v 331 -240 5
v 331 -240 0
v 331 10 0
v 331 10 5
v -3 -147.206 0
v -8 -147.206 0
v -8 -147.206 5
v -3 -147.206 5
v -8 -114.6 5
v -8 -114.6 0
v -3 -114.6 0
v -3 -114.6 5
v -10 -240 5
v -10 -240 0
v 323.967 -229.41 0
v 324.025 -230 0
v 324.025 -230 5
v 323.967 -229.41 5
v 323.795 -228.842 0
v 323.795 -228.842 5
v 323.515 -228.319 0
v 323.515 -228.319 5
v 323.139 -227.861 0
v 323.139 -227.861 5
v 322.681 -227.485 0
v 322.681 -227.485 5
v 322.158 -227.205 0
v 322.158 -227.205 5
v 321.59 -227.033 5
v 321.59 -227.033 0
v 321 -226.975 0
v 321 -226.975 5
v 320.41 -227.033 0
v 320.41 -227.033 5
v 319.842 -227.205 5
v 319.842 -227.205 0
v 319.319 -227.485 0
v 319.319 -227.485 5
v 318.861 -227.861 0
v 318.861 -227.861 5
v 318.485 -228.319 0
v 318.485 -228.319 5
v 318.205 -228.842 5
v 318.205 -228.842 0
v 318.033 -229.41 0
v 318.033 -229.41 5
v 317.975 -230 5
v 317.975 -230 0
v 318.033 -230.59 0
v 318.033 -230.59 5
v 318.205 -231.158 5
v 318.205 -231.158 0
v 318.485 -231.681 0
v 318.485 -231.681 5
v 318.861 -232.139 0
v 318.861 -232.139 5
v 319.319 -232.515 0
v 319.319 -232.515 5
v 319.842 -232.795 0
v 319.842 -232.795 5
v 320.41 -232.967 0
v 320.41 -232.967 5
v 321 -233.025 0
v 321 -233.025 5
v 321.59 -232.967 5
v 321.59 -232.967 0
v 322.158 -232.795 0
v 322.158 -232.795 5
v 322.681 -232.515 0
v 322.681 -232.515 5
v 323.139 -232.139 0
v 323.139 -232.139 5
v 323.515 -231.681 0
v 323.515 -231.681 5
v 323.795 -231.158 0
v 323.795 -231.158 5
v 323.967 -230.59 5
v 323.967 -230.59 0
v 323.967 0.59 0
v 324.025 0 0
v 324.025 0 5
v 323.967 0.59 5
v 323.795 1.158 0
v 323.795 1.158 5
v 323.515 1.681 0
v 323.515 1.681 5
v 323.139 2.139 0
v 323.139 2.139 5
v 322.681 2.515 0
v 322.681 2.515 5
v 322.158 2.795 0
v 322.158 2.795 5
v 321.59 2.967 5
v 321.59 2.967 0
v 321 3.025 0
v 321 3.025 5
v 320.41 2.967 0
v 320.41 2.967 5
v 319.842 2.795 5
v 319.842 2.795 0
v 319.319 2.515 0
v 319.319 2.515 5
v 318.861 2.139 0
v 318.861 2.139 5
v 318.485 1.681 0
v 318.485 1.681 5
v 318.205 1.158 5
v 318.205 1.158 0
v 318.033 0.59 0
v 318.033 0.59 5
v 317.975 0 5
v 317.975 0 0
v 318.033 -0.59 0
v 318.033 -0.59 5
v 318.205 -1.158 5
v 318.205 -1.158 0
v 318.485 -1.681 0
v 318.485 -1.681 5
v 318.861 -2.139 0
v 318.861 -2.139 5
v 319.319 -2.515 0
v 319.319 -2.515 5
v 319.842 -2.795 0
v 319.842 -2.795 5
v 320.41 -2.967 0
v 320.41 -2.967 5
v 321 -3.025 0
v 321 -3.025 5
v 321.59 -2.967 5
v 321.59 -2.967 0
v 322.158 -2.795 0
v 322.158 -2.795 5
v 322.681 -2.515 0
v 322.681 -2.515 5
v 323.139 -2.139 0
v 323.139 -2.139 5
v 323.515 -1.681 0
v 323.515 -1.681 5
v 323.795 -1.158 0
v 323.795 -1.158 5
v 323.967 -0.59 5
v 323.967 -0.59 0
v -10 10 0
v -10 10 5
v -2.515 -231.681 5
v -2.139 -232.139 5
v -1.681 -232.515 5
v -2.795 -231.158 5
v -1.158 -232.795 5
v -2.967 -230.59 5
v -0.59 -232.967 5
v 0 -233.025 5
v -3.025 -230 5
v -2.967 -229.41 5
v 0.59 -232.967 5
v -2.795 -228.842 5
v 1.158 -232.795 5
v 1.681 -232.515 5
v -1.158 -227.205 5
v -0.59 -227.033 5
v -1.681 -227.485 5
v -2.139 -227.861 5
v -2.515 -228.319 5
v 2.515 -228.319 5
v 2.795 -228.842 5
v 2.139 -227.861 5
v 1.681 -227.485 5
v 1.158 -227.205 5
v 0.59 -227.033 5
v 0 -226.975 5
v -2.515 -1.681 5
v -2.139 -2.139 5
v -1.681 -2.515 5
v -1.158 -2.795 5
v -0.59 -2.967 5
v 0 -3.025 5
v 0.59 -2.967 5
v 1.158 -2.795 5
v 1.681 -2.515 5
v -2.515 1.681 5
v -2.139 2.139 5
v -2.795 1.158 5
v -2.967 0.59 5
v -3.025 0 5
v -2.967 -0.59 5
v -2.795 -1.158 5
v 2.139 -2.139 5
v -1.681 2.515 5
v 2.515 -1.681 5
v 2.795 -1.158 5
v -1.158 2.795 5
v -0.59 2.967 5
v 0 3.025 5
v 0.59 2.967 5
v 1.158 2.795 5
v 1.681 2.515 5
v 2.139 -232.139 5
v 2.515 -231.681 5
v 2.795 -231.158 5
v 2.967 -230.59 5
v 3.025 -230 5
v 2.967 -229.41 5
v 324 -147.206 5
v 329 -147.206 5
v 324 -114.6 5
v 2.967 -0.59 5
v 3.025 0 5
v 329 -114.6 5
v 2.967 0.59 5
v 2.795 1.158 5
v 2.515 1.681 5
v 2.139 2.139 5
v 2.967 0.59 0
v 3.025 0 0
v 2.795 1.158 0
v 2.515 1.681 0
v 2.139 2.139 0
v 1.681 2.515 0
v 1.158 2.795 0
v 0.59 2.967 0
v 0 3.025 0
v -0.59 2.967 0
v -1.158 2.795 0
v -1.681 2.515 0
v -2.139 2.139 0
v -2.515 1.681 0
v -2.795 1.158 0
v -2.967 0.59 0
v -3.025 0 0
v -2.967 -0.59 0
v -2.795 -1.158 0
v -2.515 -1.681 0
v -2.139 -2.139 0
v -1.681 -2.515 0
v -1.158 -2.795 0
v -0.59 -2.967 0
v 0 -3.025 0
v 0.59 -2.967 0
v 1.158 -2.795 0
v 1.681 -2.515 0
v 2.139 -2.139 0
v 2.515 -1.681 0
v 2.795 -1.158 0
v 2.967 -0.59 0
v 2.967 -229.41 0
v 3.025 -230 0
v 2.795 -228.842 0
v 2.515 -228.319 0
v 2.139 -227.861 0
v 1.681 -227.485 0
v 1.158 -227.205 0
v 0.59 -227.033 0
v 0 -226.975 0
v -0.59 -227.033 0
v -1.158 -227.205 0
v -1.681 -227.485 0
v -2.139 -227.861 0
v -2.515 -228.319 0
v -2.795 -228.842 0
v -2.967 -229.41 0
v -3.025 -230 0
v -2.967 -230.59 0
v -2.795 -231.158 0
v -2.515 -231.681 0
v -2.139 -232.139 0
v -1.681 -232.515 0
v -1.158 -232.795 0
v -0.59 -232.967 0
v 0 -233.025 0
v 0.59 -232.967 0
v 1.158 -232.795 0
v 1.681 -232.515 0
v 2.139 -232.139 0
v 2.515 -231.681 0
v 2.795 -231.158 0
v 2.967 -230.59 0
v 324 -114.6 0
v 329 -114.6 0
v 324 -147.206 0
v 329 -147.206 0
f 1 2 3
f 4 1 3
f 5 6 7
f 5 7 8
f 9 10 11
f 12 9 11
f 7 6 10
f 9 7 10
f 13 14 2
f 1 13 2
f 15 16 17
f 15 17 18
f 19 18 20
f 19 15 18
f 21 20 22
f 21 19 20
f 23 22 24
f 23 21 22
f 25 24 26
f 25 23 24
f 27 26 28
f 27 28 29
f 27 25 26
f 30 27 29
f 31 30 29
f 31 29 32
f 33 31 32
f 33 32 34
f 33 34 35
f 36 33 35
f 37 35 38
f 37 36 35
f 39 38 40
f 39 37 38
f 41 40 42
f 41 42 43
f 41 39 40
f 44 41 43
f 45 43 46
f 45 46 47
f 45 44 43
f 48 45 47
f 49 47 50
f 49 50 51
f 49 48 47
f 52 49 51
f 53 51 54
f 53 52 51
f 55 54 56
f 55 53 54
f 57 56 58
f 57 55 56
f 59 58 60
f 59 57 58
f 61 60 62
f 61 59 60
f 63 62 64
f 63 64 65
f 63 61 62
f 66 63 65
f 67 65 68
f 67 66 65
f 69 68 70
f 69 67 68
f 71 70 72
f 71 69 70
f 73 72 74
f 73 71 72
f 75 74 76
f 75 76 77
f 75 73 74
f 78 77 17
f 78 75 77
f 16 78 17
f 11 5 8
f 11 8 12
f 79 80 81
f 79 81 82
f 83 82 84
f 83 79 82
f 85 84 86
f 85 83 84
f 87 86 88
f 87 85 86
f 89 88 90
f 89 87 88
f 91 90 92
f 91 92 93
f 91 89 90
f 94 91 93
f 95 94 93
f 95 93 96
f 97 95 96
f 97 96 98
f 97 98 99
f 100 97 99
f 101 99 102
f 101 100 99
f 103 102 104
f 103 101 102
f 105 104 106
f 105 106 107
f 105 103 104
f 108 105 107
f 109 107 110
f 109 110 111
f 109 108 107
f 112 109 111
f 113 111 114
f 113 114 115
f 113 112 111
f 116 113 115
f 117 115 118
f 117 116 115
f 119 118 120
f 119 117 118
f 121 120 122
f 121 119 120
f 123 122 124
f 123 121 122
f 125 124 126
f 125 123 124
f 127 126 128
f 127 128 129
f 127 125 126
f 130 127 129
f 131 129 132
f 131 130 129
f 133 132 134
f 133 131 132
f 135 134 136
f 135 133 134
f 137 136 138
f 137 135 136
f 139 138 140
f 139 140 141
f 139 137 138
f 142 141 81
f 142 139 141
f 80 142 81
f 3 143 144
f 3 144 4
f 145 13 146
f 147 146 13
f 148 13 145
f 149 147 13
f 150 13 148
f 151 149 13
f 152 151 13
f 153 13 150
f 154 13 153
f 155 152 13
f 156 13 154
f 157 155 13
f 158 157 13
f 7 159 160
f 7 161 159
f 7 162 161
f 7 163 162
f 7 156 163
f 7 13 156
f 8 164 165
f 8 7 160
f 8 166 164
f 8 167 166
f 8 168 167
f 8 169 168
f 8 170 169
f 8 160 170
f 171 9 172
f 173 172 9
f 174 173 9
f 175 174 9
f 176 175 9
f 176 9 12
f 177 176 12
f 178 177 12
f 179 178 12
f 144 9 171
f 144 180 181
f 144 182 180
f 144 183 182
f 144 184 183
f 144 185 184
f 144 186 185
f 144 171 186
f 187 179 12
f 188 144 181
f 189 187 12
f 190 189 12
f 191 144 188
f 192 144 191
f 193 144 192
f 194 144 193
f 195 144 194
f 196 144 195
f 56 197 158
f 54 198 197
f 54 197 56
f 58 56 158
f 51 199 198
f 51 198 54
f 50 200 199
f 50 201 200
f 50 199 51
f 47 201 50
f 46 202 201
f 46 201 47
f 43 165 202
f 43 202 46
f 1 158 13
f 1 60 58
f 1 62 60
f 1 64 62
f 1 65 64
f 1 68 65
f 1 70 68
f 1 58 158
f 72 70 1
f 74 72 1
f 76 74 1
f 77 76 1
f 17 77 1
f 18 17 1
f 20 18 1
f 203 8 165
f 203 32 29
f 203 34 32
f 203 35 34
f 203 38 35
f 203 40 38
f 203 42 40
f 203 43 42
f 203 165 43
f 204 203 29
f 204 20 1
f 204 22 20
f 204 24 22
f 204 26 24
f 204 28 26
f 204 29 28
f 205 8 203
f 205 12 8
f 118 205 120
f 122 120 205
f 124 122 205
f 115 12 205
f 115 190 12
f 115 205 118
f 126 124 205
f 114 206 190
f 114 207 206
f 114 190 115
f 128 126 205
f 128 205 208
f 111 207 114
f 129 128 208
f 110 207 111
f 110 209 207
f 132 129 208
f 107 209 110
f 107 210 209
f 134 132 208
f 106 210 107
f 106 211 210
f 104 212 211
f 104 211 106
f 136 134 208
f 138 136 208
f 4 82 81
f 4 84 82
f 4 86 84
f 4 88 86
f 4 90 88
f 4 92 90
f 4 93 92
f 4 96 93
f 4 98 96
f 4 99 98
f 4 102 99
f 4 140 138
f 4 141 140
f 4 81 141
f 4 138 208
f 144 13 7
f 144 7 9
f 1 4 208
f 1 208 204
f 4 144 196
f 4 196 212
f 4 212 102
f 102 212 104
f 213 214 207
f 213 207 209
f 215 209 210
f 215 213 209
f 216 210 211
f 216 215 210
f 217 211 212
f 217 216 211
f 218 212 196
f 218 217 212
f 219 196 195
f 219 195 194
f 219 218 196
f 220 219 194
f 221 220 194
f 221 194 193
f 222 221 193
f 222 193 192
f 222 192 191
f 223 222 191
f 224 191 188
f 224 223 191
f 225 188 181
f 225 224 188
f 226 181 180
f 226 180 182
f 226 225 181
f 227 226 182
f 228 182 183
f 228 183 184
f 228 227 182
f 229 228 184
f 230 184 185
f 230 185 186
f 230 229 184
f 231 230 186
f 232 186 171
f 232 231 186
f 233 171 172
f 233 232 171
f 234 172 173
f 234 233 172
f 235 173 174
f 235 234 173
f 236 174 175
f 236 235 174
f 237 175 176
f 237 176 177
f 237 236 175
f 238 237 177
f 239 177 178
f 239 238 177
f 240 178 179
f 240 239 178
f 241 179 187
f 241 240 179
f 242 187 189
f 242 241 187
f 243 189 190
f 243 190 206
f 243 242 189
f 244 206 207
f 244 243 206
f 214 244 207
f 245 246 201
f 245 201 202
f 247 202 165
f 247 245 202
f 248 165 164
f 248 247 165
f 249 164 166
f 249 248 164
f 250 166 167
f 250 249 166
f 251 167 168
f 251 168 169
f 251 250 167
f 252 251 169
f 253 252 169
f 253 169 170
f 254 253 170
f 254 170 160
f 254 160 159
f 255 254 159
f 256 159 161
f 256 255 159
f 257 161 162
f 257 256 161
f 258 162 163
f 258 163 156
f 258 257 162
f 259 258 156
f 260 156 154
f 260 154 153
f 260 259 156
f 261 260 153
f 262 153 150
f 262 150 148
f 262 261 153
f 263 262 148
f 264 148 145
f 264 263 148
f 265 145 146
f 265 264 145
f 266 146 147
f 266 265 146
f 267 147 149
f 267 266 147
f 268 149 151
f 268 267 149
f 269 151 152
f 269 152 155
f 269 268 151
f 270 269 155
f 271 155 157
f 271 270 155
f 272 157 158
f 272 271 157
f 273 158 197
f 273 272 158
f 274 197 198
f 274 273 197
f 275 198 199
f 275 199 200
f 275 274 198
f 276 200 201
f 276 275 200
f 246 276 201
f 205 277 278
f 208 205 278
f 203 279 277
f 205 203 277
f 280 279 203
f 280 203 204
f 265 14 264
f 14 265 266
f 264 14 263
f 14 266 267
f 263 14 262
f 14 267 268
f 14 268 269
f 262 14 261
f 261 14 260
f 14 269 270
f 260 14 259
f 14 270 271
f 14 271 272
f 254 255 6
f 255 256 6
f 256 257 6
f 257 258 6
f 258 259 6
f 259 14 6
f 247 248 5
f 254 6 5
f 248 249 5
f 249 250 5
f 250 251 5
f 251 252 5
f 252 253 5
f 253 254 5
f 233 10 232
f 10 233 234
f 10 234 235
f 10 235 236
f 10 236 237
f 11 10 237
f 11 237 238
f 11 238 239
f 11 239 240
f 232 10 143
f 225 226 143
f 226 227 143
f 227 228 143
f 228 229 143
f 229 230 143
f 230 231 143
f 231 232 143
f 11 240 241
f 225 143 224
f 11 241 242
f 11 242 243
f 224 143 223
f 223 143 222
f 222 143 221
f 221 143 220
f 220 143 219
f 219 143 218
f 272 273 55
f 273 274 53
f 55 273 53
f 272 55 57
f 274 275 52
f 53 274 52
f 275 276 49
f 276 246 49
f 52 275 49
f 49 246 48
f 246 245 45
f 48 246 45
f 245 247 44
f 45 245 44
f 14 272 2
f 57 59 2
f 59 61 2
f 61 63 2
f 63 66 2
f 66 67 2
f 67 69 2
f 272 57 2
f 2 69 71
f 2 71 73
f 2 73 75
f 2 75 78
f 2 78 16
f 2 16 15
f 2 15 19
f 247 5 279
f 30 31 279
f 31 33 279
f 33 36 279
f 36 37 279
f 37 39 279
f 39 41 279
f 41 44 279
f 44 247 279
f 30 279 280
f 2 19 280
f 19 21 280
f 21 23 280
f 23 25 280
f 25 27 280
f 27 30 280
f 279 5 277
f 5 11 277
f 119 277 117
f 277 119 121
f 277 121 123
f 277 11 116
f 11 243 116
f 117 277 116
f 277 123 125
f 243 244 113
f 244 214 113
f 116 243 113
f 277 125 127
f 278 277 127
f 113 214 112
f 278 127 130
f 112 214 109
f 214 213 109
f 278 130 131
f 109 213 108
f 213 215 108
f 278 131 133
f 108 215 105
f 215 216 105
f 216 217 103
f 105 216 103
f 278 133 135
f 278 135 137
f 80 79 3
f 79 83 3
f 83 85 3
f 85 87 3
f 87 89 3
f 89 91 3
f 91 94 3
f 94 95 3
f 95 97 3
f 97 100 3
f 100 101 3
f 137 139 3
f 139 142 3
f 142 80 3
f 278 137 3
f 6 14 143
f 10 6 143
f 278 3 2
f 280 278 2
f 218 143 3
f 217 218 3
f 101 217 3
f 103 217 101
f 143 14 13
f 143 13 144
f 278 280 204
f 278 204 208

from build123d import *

# Parameters (mm, degrees)
SKETCH1_W           = 341
SKETCH1_H           = 250
SKETCH1_R           = 3.025
SKETCH1_W_2         = 5
SKETCH1_H_2         = 32.605939298
BOSS_EXTRUDE1_DEPTH = 5


with BuildPart() as part:
    # Sketch1 → Boss-Extrude1 (new body)
    with BuildSketch(Plane.XY):
        with Locations((160.5, -115)):
            Rectangle(SKETCH1_W, SKETCH1_H)
        with Locations((0, -230)):
            Circle(SKETCH1_R, mode=Mode.SUBTRACT)
        Circle(SKETCH1_R, mode=Mode.SUBTRACT)
        with Locations((321, 0)):
            Circle(SKETCH1_R, mode=Mode.SUBTRACT)
        with Locations((321, -230)):
            Circle(SKETCH1_R, mode=Mode.SUBTRACT)
        with Locations((-5.5, -130.902969649)):
            Rectangle(SKETCH1_W_2, SKETCH1_H_2, mode=Mode.SUBTRACT)
        with Locations((326.5, -130.902969649)):
            Rectangle(SKETCH1_W_2, SKETCH1_H_2, mode=Mode.SUBTRACT)
    extrude(amount=BOSS_EXTRUDE1_DEPTH)


solid = part.part
